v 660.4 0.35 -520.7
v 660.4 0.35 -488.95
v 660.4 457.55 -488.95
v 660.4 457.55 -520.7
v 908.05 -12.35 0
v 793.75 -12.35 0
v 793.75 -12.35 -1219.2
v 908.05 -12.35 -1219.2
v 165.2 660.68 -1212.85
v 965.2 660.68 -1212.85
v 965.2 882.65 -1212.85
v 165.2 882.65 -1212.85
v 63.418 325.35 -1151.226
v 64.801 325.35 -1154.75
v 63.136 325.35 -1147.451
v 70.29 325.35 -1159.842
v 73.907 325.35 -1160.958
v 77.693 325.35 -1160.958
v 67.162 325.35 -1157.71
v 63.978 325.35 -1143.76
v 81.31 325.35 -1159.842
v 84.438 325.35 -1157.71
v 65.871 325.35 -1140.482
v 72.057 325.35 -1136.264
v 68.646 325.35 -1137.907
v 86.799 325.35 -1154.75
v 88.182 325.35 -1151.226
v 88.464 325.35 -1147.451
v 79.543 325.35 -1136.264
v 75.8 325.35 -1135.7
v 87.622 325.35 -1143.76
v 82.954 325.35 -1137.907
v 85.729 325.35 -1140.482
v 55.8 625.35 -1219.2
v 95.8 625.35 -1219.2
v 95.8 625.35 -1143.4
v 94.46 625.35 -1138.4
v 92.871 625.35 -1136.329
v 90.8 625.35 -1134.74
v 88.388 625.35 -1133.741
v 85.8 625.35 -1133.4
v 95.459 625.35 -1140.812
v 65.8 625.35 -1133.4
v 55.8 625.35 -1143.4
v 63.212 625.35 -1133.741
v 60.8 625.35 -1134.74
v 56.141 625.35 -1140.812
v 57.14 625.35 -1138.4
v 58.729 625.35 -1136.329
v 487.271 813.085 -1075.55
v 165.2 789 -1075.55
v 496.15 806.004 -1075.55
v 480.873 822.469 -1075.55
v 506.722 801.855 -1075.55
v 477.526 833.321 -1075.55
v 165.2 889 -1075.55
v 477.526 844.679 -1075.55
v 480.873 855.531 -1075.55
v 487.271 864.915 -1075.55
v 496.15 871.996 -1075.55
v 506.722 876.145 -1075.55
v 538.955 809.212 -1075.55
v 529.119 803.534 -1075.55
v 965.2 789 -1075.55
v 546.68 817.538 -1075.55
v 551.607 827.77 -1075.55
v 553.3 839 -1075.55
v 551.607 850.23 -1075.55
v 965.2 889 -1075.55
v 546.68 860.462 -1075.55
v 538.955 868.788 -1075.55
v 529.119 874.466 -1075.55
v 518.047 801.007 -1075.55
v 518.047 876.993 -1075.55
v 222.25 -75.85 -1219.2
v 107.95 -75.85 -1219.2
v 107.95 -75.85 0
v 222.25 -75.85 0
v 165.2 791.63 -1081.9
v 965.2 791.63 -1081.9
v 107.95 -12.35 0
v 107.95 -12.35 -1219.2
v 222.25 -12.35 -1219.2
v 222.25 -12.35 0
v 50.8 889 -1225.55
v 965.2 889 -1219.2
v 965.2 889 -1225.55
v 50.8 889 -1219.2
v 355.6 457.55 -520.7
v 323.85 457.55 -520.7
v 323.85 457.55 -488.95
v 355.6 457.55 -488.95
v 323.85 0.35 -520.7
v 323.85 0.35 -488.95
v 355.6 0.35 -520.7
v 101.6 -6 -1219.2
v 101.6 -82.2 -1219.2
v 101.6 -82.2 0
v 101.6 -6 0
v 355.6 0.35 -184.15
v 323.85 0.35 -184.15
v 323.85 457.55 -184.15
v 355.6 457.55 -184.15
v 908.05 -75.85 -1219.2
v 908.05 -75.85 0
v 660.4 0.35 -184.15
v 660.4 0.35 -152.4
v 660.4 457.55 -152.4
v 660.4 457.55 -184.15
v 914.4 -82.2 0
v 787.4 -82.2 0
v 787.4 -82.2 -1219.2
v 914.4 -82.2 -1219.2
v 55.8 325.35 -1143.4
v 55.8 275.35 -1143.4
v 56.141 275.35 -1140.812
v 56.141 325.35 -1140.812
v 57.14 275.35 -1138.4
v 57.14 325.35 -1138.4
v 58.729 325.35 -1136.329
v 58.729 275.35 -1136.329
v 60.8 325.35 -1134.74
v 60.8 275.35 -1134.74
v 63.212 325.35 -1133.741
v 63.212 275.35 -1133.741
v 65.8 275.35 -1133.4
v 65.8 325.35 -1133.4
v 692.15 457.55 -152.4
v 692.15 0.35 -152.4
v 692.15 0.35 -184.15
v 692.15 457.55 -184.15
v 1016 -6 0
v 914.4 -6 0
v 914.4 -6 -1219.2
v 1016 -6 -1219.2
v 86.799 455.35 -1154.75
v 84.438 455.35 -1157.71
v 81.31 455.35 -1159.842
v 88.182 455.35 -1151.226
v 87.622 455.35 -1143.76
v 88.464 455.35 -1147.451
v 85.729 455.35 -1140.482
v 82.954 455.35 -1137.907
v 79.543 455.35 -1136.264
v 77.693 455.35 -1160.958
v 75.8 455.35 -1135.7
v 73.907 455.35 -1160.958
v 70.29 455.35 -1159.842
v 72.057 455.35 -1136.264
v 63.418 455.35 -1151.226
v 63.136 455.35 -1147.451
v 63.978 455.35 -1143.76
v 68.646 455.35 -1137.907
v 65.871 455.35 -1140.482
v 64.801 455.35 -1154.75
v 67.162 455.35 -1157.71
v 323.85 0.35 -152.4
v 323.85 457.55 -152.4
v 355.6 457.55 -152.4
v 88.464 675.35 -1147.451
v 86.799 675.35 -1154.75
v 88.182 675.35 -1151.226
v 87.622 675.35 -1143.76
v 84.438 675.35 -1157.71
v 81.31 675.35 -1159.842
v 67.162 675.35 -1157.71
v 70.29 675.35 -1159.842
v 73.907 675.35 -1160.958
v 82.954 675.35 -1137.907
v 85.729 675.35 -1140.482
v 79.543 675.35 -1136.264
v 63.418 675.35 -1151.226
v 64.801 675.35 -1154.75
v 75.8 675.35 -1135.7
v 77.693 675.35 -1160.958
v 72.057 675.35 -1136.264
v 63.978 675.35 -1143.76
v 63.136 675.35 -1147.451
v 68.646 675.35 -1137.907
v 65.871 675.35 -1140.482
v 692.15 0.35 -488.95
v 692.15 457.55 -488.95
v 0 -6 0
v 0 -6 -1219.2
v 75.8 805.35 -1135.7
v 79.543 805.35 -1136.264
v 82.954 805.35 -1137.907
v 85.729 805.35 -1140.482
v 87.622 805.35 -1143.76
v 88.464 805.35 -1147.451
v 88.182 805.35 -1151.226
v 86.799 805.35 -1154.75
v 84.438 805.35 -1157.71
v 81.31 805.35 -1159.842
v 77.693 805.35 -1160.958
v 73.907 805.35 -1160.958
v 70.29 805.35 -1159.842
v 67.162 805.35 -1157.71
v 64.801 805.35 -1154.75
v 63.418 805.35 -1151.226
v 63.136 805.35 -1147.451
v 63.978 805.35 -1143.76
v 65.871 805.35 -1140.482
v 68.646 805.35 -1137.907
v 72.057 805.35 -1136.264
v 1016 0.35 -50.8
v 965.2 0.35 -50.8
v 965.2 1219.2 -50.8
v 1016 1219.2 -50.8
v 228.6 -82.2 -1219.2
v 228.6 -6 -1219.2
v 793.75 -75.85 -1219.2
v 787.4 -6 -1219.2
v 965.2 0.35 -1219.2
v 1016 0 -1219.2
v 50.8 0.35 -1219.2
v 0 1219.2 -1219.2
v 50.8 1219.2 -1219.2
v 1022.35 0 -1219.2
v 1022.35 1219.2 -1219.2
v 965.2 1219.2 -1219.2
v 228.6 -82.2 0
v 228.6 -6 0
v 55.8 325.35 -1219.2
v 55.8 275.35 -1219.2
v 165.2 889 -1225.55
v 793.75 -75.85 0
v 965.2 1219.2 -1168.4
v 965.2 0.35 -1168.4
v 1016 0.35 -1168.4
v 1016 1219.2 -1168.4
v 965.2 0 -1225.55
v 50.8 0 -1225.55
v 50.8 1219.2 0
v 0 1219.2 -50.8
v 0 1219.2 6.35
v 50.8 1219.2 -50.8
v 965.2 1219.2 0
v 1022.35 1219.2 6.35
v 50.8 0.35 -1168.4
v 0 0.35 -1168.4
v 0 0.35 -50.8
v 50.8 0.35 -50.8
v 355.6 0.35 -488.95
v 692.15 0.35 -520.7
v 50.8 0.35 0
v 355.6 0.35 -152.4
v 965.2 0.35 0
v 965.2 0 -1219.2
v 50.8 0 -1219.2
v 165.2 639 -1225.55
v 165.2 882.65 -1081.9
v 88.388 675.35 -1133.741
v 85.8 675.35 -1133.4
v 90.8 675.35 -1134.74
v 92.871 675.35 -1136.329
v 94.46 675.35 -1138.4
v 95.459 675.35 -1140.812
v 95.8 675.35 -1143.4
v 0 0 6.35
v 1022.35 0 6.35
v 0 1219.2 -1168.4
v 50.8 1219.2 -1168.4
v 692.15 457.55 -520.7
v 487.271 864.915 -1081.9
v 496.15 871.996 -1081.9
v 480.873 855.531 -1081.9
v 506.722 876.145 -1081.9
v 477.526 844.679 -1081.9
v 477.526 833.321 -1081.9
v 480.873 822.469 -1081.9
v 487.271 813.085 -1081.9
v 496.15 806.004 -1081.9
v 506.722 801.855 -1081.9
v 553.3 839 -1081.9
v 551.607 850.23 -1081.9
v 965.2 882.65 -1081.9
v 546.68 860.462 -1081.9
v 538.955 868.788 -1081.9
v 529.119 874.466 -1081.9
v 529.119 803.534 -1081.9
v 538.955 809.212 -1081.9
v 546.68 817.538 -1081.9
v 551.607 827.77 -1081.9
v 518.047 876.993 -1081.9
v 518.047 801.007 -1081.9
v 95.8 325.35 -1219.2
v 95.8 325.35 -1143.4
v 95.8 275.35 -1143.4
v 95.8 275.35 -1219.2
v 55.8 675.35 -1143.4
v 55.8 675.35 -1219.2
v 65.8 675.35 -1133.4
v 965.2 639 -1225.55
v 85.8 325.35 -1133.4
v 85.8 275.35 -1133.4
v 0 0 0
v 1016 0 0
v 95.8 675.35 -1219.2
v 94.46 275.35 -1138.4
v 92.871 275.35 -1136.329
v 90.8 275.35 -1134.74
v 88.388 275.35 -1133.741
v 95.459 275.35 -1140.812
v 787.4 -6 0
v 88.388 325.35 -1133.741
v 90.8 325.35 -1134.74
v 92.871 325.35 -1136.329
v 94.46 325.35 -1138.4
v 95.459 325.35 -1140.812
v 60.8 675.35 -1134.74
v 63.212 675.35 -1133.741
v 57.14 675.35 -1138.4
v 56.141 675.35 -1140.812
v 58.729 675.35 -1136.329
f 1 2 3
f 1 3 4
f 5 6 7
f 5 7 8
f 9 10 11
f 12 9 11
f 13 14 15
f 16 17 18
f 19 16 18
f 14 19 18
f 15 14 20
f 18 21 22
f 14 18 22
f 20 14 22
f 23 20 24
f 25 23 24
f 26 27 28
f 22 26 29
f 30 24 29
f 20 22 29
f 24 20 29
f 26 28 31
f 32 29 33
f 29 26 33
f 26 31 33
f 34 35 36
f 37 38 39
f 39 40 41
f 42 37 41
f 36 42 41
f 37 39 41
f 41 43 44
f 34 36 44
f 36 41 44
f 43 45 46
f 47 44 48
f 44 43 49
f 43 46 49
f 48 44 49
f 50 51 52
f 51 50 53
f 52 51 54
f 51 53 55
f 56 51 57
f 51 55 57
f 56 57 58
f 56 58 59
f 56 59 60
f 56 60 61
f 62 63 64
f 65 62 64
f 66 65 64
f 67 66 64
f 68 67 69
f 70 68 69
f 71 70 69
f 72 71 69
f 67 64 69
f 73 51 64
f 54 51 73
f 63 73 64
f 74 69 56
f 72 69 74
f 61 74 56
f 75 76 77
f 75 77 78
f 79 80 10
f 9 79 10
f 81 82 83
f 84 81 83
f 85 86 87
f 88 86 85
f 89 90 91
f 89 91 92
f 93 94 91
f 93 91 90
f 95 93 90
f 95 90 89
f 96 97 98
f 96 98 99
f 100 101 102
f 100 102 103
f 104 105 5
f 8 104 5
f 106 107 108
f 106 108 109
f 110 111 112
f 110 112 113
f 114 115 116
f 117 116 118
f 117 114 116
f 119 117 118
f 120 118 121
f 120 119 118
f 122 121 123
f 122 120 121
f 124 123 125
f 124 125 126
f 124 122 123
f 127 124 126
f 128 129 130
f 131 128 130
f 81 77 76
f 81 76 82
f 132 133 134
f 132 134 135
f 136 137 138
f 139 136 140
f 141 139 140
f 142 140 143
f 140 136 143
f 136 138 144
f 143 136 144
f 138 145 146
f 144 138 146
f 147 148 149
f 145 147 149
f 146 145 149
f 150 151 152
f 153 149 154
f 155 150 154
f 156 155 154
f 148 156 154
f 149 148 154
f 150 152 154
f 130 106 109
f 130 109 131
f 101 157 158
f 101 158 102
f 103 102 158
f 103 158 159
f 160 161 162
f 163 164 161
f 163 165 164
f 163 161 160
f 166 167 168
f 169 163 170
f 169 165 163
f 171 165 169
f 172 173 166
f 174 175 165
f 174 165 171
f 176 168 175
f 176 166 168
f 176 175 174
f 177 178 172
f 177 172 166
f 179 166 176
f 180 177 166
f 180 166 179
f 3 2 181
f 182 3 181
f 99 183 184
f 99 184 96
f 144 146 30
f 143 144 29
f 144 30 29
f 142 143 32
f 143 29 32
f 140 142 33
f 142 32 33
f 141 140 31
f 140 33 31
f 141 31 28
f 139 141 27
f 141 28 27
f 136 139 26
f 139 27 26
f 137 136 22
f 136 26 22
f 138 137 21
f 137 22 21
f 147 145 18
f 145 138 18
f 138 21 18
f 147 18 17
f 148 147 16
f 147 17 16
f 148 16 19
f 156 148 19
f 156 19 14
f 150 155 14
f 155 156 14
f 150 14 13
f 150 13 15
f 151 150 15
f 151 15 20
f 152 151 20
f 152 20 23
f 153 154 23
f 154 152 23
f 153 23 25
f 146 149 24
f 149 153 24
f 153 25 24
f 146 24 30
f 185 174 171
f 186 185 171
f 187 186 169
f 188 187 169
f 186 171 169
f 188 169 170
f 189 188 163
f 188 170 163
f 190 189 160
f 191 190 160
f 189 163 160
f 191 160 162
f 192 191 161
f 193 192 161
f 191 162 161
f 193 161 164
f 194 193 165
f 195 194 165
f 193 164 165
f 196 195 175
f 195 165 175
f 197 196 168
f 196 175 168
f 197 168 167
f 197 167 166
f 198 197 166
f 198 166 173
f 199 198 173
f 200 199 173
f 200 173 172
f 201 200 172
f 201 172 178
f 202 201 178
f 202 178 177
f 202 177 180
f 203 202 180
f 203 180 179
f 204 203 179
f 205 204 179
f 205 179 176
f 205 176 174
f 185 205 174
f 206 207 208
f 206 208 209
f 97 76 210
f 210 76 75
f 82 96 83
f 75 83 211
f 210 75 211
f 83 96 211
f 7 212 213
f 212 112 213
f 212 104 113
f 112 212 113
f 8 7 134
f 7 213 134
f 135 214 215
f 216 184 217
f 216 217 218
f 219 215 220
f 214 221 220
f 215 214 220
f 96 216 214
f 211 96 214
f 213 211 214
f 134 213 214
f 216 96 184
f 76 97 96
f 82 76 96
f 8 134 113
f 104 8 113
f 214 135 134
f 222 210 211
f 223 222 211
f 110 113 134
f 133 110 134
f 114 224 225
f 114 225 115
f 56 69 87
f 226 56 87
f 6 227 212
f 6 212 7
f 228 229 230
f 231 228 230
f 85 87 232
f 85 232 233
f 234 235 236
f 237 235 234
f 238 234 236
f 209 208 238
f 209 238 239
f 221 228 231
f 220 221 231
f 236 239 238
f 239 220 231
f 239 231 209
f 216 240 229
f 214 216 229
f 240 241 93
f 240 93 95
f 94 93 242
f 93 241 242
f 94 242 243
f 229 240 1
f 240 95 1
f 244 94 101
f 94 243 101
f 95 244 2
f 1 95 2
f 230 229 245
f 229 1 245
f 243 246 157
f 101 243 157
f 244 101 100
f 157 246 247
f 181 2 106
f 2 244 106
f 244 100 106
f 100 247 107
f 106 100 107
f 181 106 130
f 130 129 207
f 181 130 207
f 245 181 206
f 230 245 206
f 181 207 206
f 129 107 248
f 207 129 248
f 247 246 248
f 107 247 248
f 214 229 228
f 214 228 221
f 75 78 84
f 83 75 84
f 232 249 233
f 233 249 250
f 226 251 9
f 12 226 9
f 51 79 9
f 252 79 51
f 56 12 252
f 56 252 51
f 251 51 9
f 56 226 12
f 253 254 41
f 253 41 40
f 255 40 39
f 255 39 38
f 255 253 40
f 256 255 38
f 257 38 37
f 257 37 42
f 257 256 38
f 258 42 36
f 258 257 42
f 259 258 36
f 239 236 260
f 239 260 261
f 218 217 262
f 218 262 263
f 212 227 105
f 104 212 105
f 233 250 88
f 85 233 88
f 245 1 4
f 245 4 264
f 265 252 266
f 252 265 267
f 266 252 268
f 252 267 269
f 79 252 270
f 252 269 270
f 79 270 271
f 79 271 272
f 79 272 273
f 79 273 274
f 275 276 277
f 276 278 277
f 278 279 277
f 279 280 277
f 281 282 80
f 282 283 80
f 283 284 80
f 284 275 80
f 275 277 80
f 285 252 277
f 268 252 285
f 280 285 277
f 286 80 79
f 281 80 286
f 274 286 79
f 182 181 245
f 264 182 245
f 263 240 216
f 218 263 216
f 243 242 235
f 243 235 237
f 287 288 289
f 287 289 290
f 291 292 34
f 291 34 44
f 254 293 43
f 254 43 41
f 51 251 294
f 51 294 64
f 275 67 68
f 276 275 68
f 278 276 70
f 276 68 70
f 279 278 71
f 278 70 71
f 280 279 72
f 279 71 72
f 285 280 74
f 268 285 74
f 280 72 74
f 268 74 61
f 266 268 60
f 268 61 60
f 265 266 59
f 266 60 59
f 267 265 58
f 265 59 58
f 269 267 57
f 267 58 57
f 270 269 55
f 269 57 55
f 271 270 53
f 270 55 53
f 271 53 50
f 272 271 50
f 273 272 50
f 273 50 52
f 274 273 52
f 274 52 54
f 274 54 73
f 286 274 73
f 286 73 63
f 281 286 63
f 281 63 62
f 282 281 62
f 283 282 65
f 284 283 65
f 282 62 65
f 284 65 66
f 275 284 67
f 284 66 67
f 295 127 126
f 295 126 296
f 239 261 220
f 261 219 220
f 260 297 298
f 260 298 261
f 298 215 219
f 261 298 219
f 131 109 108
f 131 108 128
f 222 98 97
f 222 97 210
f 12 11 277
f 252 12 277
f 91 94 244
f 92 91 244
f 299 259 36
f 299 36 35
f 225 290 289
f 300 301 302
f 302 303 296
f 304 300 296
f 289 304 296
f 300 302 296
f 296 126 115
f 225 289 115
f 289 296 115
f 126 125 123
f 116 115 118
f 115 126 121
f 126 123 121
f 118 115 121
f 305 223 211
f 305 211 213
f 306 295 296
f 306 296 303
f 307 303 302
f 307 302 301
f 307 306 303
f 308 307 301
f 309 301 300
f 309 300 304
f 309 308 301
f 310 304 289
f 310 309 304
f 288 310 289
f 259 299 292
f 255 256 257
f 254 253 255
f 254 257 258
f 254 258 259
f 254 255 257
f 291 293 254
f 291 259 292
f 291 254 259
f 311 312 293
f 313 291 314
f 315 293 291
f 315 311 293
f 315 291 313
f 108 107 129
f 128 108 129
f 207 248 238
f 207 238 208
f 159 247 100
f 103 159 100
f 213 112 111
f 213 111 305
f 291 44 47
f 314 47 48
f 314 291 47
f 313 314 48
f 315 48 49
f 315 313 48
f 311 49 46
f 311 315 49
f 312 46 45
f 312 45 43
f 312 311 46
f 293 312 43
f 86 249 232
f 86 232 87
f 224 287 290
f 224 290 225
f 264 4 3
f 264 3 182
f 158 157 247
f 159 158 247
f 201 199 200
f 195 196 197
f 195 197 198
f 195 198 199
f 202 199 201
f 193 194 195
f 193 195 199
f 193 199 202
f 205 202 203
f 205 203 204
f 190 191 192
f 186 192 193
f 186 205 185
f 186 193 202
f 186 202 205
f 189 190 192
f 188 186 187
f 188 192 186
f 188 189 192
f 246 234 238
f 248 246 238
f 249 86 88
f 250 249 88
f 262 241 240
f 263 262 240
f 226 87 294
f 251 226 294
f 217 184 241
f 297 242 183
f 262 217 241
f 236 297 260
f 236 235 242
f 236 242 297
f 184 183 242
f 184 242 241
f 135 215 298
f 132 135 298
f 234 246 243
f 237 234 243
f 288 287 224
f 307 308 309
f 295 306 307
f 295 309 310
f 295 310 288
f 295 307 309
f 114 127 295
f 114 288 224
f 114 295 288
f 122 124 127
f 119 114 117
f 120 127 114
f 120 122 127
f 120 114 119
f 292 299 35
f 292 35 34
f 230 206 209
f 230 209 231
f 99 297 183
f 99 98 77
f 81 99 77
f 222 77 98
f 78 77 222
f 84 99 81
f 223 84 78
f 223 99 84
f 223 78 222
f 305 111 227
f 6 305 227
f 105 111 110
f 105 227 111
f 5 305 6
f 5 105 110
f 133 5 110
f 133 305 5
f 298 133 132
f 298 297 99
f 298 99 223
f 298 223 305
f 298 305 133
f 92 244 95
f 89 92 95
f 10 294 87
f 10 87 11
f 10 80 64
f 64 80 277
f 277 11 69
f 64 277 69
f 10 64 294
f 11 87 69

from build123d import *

# Parameters (mm, degrees)
SKETCH3_W                = 50.8
SKETCH3_H                = 50.8
BOSS_EXTRUDE1_DEPTH      = 1219.2
BOSS_EXTRUDE1_2_DEPTH    = 1219.2
BOSS_EXTRUDE1_3_DEPTH    = 1219.2
BOSS_EXTRUDE1_4_DEPTH    = 1219.2
SKETCH4_W                = 1219.2
SKETCH4_H                = 1219.2
BOSS_EXTRUDE2_DEPTH      = 6.35
SKETCH6_W                = 1022.35
SKETCH6_H                = 1219.2
BOSS_EXTRUDE4_DEPTH      = 6.35
BOSS_EXTRUDE7_DEPTH      = 6
BOSS_EXTRUDE7_DEPTH_BACK = 0.35
SKETCH7_W                = 1016
SKETCH7_H                = 1219.2
SKETCH8_W                = 914.4
SKETCH8_H                = 889
BOSS_EXTRUDE8_DEPTH      = 6.35
BOSS_EXTRUDE18_DEPTH     = 800
SKETCH12_W               = 127
SKETCH12_H               = 76.2
SKETCH12_W_2             = 114.3
SKETCH12_H_2             = 63.5
BOSS_EXTRUDE19_DEPTH     = 1219.2
SKETCH17_W               = 31.75
SKETCH17_H               = 31.75
BOSS_EXTRUDE20_DEPTH     = 457.2
BOSS_EXTRUDE21_START     = 325
SKETCH18_R               = 12.7
BOSS_EXTRUDE21_DEPTH     = 480
SKETCH19_W               = 25.4
SKETCH19_H               = 220
CUT_EXTRUDE3_DEPTH       = 100
BOSS_EXTRUDE23_DEPTH     = 50
BOSS_EXTRUDE25_START     = 350
BOSS_EXTRUDE25_DEPTH     = 50
SKETCH21_R               = 38.1
CUT_EXTRUDE4_DEPTH       = 6.35


with BuildPart() as part:
    # Sketch3 → Boss-Extrude1 (new body)
    with BuildSketch(Plane(origin=(0, 0, 0), x_dir=(1, 0, 0), z_dir=(0, 1, 0))):
        with Locations((25.4, 25.4)):
            Rectangle(SKETCH3_W, SKETCH3_H)
    extrude(amount=BOSS_EXTRUDE1_DEPTH)



with BuildPart() as body_2:
    # Sketch3 → Boss-Extrude1 2 (new body)
    with BuildSketch(Plane(origin=(0, 0, 0), x_dir=(1, 0, 0), z_dir=(0, 1, 0))):
        with Locations((990.6, 25.4)):
            Rectangle(SKETCH3_W, SKETCH3_H)
    extrude(amount=BOSS_EXTRUDE1_2_DEPTH)



with BuildPart() as body_3:
    # Sketch3 → Boss-Extrude1 3 (new body)
    with BuildSketch(Plane(origin=(0, 0, 0), x_dir=(1, 0, 0), z_dir=(0, 1, 0))):
        with Locations((25.4, 1193.8)):
            Rectangle(SKETCH3_W, SKETCH3_H)
    extrude(amount=BOSS_EXTRUDE1_3_DEPTH)


with BuildPart() as body_4:
    # Sketch3 → Boss-Extrude1 4 (new body)
    with BuildSketch(Plane(origin=(0, 0, 0), x_dir=(1, 0, 0), z_dir=(0, 1, 0))):
        with Locations((990.6, 1193.8)):
            Rectangle(SKETCH3_W, SKETCH3_H)
    extrude(amount=BOSS_EXTRUDE1_4_DEPTH)


with BuildPart() as body_2_1:
    add(body_2.part)

    add(body_4.part)  # Boss-Extrude2 merges body 4
    # Sketch4 → Boss-Extrude2 (add)
    with BuildSketch(Plane(origin=(1016, 0, 0), x_dir=(0, 0, -1), z_dir=(1, 0, 0))):
        with Locations((609.6, 609.6)):
            Rectangle(SKETCH4_W, SKETCH4_H)
    extrude(amount=BOSS_EXTRUDE2_DEPTH)


with BuildPart() as part_1:
    add(part.part)

    add(body_2_1.part)  # Boss-Extrude4 merges body 2
    # Sketch6 → Boss-Extrude4 (add)
    with BuildSketch(Plane.XY):
        with Locations((511.175, 609.6)):
            Rectangle(SKETCH6_W, SKETCH6_H)
    extrude(amount=BOSS_EXTRUDE4_DEPTH)


    add(body_3.part)  # Boss-Extrude7 merges body 3
    # Sketch7 → Boss-Extrude7 (add, two sides: drawn at the far end of the back side and taken through both)
    with BuildSketch(Plane.XZ.offset(-BOSS_EXTRUDE7_DEPTH_BACK)):
        with Locations((508, -609.6)):
            Rectangle(SKETCH7_W, SKETCH7_H)
    extrude(amount=BOSS_EXTRUDE7_DEPTH + BOSS_EXTRUDE7_DEPTH_BACK)

    # Sketch12 → Boss-Extrude19 (add)
    # profile 1 of 2: a face of its own
    with BuildSketch(Plane.XY):
        with Locations((165.1, -44.1)):
            Rectangle(SKETCH12_W, SKETCH12_H)
        with Locations((165.1, -44.1)):
            Rectangle(SKETCH12_W_2, SKETCH12_H_2, mode=Mode.SUBTRACT)
    # profile 2 of 2: a face of its own
    with BuildSketch(Plane.XY):
        with Locations((850.9, -44.1)):
            Rectangle(SKETCH12_W, SKETCH12_H)
        with Locations((850.9, -44.1)):
            Rectangle(SKETCH12_W_2, SKETCH12_H_2, mode=Mode.SUBTRACT)
    extrude(amount=-BOSS_EXTRUDE19_DEPTH)

    # Sketch17 → Boss-Extrude20 (add)
    with BuildSketch(Plane(origin=(0, 0.35, 0), x_dir=(1, 0, 0), z_dir=(0, 1, 0))):
        with Locations((339.725, 504.825)):
            Rectangle(SKETCH17_W, SKETCH17_H)
        with Locations((676.275, 504.825)):
            Rectangle(SKETCH17_W, SKETCH17_H)
        with Locations((339.725, 168.275)):
            Rectangle(SKETCH17_W, SKETCH17_H)
        with Locations((676.275, 168.275)):
            Rectangle(SKETCH17_W, SKETCH17_H)
    extrude(amount=BOSS_EXTRUDE20_DEPTH)


with BuildPart() as body_2_2:
    # Sketch8 → Boss-Extrude8 (new body)
    with BuildSketch(Plane(origin=(0, 0, -1219.2), x_dir=(-1, 0, 0), z_dir=(0, 0, -1))):
        with Locations((-508, 444.5)):
            Rectangle(SKETCH8_W, SKETCH8_H)
    extrude(amount=BOSS_EXTRUDE8_DEPTH)


with BuildPart() as body_3_2:
    # Sketch11 → Boss-Extrude18 (new body)
    with BuildSketch(Plane.ZY.offset(-965.2)):
        Polygon((-1225.55, 639), (-1075.55, 789), (-1075.55, 889), (-1225.55, 889), align=None)
        Polygon((-1212.85, 882.65), (-1081.9, 882.65), (-1081.9, 791.630256121), (-1212.85, 660.680256121), align=None, mode=Mode.SUBTRACT)
    extrude(amount=BOSS_EXTRUDE18_DEPTH)

    # Sketch21 → Cut-Extrude4 (cut)
    with BuildSketch(Plane.XY.offset(-1075.55)):
        with Locations((515.2, 839)):
            Circle(SKETCH21_R)
    extrude(amount=-CUT_EXTRUDE4_DEPTH, mode=Mode.SUBTRACT)


with BuildPart() as body_4_2:
    # Sketch18 → Boss-Extrude21 (new body)
    with BuildSketch(Plane(origin=(0, 0.35, 0), x_dir=(1, 0, 0), z_dir=(0, 1, 0)).offset(BOSS_EXTRUDE21_START)):
        with Locations(Location((75.8, 1148.4, 0), (0, 0, 270))):
            Circle(SKETCH18_R)
    extrude(amount=BOSS_EXTRUDE21_DEPTH)

    # Sketch19 → Cut-Extrude3 (cut)
    with BuildSketch(Plane.ZY):
        with Locations((-1148.4, 565.35)):
            Rectangle(SKETCH19_W, SKETCH19_H)
    extrude(amount=-CUT_EXTRUDE3_DEPTH, mode=Mode.SUBTRACT)


with BuildPart() as cut_extrude3_piece_1:
    # of the separate pieces the step leaves, piece 1, a body of its own (cut_extrude3_pieces)
    add(body_4_2.part.solids().sort_by_distance((75.8, 325.35, -1135.7))[0])


with BuildPart() as cut_extrude3_piece_2:
    # of the separate pieces the step leaves, piece 2, a body of its own (cut_extrude3_pieces)
    add(body_4_2.part.solids().sort_by_distance((75.8, 675.35, -1135.7))[0])


with BuildPart() as body_6:
    # Sketch20 → Boss-Extrude23 (new body)
    with BuildSketch(Plane.XZ.offset(-675.35)):
        with BuildLine():
            Line((95.8, -1219.2), (55.8, -1219.2))
            Line((55.8, -1219.2), (55.8, -1143.4))
            ThreePointArc((55.8, -1143.4), (58.728932188, -1136.328932188), (65.8, -1133.4))
            Line((65.8, -1133.4), (85.8, -1133.4))
            ThreePointArc((85.8, -1133.4), (92.871067812, -1136.328932188), (95.8, -1143.4))
            Line((95.8, -1143.4), (95.8, -1219.2))
        make_face()
    extrude(amount=BOSS_EXTRUDE23_DEPTH)


with BuildPart() as body_7:
    # Sketch20<2> → Boss-Extrude25 (new body)
    with BuildSketch(Plane.XZ.offset(-675.35).offset(BOSS_EXTRUDE25_START)):
        with BuildLine():
            Line((95.8, -1219.2), (55.8, -1219.2))
            Line((55.8, -1219.2), (55.8, -1143.4))
            ThreePointArc((55.8, -1143.4), (58.728932188, -1136.328932188), (65.8, -1133.4))
            Line((65.8, -1133.4), (85.8, -1133.4))
            ThreePointArc((85.8, -1133.4), (92.871067812, -1136.328932188), (95.8, -1143.4))
            Line((95.8, -1143.4), (95.8, -1219.2))
        make_face()
    extrude(amount=BOSS_EXTRUDE25_DEPTH)


solid = Compound([part_1.part, body_2_2.part, body_3_2.part, cut_extrude3_piece_1.part, cut_extrude3_piece_2.part, body_6.part, body_7.part])
